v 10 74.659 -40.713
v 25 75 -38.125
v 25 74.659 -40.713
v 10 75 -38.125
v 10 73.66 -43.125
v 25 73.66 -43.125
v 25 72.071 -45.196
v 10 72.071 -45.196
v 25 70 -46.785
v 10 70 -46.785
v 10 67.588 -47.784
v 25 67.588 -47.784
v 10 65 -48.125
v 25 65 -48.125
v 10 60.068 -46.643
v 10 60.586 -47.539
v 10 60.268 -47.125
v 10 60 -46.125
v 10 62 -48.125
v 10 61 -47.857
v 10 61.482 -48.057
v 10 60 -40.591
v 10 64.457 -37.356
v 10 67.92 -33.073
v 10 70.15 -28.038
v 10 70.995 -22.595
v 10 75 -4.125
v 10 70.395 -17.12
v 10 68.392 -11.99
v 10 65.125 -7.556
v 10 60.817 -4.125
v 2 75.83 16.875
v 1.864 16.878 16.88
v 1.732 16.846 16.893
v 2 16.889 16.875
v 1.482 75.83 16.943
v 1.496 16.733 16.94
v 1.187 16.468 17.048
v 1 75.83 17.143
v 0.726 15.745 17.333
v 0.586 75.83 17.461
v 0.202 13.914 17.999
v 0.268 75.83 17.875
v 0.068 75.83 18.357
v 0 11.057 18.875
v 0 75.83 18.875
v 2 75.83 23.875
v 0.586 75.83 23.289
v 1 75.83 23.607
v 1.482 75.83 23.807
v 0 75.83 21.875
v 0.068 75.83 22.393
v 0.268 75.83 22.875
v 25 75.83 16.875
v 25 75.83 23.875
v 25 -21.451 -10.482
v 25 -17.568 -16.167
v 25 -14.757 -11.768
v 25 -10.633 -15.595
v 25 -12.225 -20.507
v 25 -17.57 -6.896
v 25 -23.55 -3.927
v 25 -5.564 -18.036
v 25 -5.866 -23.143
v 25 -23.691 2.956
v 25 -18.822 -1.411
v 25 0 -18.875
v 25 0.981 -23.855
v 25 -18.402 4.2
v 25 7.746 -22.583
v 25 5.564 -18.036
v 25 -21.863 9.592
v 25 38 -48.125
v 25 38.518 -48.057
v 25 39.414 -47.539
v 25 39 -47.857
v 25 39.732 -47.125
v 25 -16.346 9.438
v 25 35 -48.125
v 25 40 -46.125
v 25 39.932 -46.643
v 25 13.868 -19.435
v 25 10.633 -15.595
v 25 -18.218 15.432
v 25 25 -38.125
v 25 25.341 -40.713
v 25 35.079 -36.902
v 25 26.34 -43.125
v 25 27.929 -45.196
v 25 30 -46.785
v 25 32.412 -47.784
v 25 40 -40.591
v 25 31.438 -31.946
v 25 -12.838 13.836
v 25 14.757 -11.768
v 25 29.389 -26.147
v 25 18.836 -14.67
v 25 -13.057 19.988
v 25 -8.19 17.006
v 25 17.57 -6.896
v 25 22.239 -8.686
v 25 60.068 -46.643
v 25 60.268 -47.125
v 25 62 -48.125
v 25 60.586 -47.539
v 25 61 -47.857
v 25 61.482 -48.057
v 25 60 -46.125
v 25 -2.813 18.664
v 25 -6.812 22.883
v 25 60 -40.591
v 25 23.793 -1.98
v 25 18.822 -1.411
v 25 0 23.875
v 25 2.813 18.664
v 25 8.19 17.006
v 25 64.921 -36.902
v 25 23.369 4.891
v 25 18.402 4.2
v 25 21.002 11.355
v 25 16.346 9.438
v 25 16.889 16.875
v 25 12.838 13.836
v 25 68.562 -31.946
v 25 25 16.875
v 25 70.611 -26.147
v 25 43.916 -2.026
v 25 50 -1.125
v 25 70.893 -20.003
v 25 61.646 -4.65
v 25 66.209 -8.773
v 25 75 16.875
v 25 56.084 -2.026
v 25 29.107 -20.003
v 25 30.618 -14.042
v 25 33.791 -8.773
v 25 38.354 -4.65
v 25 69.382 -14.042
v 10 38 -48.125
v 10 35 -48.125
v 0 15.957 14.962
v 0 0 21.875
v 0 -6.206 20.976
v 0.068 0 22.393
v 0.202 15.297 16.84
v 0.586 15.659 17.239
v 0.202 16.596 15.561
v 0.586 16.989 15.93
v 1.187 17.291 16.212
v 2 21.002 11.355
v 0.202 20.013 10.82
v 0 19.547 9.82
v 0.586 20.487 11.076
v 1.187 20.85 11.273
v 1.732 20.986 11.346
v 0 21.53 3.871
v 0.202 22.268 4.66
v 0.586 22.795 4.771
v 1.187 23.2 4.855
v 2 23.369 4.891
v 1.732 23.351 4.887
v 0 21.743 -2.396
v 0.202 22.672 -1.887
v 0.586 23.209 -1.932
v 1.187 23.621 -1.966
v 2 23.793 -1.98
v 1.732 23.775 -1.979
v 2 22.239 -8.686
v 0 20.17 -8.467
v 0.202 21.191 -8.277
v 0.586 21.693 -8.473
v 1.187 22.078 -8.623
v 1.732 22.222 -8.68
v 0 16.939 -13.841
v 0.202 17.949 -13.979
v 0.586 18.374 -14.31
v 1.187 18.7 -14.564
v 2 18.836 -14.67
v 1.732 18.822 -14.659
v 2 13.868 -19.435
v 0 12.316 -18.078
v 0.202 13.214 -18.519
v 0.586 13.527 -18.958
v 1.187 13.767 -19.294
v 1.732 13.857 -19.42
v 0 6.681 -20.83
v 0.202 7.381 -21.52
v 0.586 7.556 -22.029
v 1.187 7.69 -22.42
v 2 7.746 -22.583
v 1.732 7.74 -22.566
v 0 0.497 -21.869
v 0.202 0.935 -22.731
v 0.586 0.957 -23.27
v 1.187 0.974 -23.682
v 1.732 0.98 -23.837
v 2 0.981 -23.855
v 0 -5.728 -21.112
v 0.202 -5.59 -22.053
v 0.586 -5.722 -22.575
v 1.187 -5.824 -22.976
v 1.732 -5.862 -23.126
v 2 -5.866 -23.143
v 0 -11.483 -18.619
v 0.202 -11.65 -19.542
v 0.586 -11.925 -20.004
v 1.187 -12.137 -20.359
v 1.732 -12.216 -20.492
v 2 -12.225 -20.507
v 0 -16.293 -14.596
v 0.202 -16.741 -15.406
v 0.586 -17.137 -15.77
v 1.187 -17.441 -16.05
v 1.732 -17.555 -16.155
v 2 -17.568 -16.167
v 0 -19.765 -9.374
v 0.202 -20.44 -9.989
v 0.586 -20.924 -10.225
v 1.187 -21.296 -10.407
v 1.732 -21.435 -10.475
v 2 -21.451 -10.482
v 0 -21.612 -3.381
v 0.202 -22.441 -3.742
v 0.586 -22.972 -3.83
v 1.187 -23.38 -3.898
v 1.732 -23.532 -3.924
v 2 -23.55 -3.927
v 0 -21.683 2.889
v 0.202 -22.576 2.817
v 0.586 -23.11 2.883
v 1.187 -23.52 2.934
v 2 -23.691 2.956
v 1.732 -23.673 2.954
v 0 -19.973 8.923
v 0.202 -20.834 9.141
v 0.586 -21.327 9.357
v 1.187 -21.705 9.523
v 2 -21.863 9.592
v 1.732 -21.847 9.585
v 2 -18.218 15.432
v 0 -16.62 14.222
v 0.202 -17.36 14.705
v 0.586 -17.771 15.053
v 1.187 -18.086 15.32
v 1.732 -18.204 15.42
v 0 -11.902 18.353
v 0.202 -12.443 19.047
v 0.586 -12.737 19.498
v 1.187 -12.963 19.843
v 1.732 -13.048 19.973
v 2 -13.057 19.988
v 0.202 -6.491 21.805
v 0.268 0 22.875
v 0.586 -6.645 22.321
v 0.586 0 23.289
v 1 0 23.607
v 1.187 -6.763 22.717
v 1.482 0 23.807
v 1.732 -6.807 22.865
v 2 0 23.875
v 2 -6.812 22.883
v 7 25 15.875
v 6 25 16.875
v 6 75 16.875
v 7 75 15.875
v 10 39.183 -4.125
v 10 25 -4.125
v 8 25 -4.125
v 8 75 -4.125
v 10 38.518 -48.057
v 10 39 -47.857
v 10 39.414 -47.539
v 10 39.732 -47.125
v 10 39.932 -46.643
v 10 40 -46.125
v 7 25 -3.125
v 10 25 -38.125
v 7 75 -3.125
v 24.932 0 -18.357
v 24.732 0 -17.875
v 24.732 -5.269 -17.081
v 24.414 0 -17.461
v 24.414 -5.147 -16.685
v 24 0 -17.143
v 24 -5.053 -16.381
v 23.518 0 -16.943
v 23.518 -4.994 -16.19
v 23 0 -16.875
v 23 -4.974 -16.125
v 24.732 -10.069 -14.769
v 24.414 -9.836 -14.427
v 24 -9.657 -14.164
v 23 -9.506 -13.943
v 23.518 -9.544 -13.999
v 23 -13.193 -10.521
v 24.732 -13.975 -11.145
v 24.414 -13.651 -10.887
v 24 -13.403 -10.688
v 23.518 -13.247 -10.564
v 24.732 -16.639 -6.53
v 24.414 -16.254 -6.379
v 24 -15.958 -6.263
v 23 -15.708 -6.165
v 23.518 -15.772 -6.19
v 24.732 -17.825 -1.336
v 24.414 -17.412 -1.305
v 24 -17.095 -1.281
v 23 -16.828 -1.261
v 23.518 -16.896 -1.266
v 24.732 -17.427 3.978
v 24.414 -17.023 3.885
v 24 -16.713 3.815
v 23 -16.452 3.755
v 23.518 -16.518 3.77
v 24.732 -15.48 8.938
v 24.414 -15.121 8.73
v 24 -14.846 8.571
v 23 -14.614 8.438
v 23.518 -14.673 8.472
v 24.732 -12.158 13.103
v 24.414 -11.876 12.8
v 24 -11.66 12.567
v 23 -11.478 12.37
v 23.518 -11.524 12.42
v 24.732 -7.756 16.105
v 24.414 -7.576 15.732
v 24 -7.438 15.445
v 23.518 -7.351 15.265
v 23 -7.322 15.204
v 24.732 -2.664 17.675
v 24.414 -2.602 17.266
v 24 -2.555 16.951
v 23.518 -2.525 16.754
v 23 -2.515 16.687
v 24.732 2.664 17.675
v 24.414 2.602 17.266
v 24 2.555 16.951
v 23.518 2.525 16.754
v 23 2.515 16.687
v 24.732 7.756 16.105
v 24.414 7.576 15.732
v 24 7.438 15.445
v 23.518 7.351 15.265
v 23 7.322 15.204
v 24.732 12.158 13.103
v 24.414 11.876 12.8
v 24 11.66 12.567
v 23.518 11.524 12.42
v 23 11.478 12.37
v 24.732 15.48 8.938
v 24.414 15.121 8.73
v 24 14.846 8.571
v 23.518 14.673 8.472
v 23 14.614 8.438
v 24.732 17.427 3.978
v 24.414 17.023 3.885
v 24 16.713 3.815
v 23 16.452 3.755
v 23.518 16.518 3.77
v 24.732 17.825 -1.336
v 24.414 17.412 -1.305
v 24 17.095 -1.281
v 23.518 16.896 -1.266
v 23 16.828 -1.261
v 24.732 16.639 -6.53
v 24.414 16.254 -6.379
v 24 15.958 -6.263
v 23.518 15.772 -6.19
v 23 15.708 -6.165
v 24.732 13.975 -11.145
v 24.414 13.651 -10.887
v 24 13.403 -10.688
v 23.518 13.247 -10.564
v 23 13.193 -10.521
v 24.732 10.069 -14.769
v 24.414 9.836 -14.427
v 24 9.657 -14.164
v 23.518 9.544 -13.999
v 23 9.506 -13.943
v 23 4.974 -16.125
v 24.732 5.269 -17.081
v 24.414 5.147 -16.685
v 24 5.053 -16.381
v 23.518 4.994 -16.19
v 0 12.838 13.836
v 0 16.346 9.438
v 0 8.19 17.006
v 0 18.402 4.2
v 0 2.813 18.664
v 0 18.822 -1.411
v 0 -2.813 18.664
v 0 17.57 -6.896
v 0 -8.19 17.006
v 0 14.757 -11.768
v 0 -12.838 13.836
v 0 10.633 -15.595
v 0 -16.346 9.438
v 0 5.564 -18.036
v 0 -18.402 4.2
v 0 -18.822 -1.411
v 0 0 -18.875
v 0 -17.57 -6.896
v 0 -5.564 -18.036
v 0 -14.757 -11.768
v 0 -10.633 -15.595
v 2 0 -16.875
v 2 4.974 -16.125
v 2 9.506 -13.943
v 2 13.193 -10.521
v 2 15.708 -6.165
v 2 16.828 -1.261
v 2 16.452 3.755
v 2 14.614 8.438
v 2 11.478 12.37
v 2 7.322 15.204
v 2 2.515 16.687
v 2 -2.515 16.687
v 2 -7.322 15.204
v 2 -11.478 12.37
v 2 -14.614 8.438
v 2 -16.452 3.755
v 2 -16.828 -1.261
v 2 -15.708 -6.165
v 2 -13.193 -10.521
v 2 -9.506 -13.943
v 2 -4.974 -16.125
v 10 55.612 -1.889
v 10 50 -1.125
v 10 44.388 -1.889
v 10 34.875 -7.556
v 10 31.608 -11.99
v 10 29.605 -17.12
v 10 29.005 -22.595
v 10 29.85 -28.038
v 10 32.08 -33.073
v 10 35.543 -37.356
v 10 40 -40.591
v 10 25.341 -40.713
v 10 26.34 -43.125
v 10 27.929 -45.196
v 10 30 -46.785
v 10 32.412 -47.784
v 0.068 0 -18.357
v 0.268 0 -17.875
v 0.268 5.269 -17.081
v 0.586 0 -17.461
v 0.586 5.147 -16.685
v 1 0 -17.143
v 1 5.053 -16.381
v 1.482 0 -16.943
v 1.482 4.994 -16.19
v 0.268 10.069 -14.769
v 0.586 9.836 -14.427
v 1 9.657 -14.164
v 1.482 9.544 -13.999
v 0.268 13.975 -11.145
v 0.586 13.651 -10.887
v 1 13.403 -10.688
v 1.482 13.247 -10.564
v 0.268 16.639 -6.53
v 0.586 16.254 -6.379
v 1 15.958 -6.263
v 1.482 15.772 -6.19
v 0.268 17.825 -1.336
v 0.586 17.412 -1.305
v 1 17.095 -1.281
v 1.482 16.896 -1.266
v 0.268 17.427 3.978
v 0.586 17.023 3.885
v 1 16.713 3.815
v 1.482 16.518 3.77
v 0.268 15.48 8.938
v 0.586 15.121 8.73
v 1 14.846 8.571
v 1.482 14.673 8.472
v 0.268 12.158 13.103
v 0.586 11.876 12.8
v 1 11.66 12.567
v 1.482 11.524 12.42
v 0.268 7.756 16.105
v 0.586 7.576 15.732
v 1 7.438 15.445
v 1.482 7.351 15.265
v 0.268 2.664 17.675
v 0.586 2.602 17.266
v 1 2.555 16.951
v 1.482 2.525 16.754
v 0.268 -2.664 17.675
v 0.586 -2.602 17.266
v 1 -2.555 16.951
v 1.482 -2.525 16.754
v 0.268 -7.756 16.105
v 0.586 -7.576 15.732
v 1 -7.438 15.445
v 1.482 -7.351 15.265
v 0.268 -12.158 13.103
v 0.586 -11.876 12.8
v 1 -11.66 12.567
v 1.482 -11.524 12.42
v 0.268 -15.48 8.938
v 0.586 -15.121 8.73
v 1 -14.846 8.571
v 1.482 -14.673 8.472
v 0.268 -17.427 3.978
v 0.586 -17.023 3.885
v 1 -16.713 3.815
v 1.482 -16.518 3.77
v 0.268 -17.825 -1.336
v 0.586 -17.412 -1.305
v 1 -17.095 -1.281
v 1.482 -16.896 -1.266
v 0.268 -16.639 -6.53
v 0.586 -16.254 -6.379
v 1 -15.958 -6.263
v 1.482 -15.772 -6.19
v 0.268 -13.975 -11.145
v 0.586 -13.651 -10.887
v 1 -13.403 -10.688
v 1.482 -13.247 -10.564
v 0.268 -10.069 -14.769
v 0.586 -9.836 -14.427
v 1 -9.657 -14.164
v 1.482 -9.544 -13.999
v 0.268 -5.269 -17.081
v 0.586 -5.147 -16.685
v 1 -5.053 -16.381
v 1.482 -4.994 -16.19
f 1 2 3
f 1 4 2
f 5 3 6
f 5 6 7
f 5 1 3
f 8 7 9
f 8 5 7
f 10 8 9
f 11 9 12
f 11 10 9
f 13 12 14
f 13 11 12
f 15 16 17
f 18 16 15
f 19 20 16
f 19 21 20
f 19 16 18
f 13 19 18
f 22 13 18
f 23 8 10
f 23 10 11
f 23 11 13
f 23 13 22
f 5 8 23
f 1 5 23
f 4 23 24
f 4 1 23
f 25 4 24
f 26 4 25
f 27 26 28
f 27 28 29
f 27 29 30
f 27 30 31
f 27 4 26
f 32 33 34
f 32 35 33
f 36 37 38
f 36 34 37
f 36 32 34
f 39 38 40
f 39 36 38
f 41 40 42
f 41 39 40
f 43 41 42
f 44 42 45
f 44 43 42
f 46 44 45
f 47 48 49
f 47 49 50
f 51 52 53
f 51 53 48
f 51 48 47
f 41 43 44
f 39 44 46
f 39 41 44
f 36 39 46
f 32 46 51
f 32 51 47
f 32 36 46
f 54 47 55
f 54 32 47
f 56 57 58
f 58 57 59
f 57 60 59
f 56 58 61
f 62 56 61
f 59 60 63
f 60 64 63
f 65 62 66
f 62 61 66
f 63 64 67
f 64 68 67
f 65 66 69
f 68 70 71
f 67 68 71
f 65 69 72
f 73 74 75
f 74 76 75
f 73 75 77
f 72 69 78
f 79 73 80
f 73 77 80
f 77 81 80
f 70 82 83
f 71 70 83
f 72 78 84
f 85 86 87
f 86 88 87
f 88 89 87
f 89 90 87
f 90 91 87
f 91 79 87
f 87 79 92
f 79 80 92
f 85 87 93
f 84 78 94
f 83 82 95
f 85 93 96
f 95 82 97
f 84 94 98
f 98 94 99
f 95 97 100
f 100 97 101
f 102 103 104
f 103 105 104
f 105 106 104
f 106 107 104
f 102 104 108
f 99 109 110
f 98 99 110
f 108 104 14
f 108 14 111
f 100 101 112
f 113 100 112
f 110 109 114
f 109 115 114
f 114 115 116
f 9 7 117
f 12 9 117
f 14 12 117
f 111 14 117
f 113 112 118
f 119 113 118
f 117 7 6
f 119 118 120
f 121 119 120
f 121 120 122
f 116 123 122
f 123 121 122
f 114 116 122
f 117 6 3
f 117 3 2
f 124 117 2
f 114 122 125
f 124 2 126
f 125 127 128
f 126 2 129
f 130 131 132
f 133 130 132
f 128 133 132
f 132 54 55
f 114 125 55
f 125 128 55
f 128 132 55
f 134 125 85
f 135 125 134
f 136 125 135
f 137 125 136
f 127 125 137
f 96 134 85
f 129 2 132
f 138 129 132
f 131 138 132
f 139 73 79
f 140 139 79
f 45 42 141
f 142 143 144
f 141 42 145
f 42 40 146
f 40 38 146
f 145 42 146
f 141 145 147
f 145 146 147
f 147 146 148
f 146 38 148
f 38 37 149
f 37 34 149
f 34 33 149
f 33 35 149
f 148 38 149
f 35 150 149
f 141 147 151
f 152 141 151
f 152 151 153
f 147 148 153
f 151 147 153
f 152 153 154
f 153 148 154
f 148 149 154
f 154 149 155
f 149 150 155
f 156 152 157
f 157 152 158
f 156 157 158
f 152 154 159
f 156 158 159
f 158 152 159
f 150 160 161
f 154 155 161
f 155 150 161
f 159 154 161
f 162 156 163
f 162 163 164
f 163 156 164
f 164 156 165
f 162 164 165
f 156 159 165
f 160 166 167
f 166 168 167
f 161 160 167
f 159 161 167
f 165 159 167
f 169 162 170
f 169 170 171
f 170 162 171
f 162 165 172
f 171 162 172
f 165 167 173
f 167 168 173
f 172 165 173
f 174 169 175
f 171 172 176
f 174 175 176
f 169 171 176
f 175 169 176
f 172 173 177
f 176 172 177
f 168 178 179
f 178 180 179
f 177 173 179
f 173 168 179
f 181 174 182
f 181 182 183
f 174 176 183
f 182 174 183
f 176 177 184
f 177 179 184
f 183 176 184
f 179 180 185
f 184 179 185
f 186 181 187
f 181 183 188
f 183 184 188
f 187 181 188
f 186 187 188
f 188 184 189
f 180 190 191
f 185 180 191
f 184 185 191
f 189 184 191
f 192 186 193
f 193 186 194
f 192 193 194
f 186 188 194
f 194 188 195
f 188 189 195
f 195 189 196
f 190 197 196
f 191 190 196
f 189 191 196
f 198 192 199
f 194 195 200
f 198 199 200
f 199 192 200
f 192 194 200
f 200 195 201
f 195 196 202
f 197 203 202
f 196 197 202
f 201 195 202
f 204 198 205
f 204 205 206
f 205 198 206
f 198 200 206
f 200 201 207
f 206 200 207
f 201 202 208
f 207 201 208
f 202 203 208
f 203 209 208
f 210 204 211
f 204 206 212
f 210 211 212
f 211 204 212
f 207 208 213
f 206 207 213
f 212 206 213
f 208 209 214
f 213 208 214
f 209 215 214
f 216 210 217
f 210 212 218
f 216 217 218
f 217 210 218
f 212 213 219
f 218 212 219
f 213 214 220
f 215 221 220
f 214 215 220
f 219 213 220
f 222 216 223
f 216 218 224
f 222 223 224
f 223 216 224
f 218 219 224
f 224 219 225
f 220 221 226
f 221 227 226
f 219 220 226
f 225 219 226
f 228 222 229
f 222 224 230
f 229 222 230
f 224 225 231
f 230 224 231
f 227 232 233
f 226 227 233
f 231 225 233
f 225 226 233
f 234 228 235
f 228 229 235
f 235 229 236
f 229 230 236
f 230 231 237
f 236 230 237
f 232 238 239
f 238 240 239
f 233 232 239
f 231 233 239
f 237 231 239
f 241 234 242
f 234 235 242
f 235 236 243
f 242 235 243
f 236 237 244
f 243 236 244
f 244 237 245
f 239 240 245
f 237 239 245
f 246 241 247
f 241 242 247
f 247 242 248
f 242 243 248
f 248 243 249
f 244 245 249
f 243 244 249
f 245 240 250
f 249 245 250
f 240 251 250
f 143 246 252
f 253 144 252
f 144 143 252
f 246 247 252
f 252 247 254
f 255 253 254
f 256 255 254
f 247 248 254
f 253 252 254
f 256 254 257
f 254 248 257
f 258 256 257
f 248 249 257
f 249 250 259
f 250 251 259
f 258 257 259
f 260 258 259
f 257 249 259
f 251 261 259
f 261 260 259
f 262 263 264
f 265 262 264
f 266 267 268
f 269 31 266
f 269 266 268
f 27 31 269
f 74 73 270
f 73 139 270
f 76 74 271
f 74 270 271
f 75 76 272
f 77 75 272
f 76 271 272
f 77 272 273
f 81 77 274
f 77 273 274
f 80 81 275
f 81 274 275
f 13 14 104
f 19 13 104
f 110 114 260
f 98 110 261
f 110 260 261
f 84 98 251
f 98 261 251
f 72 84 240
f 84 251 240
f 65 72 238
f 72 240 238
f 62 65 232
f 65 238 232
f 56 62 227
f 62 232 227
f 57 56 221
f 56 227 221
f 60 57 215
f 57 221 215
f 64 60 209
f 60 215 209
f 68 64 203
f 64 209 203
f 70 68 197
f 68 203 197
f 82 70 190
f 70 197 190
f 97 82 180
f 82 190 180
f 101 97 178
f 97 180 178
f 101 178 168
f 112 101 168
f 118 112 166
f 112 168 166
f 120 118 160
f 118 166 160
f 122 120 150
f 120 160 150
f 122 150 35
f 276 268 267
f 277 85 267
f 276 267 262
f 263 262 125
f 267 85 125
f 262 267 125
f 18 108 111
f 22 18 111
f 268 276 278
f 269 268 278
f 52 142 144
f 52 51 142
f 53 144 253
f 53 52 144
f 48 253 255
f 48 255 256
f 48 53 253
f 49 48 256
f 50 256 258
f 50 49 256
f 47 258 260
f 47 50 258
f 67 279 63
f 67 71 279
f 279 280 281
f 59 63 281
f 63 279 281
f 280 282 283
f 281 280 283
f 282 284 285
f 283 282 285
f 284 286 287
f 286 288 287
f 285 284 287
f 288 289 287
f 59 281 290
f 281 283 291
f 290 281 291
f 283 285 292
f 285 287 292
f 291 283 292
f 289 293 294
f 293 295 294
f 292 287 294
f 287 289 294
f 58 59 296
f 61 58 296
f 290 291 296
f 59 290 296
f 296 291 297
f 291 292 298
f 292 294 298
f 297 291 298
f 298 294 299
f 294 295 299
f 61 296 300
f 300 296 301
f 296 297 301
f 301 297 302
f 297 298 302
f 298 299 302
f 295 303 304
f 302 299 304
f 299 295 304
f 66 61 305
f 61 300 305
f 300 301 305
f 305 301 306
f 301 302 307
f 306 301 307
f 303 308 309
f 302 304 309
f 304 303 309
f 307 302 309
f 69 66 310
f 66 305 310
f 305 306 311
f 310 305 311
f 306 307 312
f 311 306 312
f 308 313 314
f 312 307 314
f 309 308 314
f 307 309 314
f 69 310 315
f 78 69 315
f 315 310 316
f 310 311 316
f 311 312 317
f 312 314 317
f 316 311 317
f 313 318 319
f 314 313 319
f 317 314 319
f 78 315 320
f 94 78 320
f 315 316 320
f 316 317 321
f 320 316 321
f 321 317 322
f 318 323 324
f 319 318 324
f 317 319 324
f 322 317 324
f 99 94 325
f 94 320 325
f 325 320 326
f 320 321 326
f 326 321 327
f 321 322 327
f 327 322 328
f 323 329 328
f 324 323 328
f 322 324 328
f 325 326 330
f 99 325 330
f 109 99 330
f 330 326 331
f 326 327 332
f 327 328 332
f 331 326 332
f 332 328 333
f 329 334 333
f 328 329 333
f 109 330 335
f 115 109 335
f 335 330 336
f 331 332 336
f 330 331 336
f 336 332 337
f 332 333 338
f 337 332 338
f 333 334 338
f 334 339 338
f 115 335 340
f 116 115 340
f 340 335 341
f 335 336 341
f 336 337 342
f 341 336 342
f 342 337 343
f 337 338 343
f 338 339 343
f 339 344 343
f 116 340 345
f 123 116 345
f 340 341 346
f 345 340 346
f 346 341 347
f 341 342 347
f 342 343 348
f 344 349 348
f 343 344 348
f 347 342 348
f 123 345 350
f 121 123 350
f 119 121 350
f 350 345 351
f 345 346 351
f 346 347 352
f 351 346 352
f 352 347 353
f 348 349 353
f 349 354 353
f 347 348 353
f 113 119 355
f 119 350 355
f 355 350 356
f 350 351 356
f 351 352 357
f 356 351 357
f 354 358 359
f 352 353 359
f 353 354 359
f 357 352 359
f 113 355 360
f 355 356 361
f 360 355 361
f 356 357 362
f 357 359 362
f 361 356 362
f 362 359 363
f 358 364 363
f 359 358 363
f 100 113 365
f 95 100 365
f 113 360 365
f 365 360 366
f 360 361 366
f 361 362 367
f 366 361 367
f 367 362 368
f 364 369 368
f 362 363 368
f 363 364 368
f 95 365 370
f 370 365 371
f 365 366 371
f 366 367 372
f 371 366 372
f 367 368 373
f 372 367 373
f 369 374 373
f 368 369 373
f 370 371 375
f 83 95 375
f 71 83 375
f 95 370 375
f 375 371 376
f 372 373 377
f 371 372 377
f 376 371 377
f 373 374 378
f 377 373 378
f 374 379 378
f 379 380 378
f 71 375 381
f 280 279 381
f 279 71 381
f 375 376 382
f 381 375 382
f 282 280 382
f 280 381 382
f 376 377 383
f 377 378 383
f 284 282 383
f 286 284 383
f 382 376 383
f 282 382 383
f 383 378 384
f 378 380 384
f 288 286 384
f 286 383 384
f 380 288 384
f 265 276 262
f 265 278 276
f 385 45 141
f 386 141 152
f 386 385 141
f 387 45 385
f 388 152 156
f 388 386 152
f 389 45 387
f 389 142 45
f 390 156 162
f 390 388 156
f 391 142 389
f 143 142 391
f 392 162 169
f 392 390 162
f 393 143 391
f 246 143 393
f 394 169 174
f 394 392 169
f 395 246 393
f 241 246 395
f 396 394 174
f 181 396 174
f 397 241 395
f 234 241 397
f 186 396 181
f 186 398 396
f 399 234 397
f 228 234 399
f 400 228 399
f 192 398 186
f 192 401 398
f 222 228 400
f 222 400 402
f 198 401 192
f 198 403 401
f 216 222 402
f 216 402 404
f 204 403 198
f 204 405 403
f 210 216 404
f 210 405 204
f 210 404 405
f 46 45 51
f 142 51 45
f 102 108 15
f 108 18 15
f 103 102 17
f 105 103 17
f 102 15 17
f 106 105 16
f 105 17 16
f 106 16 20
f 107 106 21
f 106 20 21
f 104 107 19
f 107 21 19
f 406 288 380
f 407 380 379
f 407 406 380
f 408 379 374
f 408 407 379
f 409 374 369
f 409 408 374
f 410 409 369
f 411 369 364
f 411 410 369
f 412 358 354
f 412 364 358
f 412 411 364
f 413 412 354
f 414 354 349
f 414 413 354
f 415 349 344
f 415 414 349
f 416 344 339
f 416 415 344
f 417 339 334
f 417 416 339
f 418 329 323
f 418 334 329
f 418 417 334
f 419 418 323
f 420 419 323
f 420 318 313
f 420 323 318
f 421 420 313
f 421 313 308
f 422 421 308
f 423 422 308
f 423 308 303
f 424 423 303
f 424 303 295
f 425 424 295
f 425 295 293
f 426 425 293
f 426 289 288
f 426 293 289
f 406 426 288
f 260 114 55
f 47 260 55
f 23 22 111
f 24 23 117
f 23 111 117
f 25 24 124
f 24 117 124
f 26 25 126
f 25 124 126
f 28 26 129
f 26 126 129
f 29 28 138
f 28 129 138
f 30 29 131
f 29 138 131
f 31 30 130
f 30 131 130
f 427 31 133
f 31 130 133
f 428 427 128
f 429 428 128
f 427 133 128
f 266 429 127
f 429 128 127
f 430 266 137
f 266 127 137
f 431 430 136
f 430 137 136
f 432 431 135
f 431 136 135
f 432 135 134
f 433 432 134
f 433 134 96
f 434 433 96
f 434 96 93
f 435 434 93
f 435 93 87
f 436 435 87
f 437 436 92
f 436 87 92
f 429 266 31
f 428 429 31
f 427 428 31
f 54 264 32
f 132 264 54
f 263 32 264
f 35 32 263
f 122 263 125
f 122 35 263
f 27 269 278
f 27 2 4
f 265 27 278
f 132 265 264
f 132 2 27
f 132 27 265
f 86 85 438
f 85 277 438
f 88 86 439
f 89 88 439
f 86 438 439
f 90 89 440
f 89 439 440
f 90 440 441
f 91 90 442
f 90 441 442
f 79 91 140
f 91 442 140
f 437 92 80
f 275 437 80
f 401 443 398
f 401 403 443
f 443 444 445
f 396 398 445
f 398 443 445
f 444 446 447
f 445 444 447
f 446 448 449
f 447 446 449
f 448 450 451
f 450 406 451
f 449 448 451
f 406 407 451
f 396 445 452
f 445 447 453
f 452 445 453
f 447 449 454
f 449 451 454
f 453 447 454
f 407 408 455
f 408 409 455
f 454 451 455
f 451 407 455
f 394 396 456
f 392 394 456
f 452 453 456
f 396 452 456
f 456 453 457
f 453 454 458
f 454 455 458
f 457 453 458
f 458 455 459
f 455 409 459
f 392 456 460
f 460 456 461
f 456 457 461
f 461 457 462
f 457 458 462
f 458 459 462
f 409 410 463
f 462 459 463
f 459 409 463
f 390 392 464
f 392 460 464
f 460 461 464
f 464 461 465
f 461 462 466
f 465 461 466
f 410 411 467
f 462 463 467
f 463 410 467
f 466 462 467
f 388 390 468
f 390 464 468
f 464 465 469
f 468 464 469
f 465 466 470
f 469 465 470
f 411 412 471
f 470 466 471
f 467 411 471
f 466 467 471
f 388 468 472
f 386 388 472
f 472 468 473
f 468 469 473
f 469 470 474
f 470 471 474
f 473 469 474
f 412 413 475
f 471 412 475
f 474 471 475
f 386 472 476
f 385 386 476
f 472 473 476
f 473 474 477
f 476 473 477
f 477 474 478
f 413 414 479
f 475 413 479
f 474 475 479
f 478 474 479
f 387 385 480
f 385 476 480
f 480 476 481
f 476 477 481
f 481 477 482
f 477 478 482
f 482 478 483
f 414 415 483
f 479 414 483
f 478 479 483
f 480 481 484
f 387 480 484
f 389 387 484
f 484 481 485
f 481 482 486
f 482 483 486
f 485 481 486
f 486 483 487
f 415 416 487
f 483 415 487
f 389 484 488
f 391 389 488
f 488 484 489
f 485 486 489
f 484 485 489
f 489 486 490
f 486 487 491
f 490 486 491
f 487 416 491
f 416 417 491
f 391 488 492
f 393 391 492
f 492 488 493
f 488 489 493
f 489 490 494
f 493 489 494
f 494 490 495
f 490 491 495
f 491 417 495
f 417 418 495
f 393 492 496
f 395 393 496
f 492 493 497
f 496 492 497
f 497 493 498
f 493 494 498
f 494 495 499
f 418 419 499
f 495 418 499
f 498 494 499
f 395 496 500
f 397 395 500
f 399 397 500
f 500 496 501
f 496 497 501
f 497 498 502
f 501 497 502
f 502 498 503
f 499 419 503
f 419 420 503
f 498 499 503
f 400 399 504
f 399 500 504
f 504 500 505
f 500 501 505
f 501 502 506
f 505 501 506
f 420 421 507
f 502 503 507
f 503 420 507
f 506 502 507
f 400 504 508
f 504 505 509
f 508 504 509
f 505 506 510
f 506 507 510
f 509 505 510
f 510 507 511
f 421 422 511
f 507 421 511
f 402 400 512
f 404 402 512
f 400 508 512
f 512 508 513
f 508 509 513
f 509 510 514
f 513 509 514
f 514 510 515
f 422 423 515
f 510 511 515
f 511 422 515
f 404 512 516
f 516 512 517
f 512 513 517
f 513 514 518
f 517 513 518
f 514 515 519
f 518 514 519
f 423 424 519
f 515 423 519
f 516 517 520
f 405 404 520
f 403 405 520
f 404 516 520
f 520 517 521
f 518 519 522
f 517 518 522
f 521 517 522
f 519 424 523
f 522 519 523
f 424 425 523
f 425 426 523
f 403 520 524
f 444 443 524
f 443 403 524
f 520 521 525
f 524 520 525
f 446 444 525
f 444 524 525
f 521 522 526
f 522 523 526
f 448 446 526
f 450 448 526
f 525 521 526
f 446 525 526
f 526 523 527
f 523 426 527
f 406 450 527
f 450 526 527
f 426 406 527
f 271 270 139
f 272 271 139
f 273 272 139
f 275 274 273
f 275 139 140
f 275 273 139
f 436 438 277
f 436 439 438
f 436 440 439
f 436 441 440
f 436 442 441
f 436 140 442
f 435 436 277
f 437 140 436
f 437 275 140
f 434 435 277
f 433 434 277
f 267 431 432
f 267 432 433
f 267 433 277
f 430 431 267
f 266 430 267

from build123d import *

# Parameters (mm, degrees)
SKETCH1_R           = 23.875
SKETCH1_R_2         = 16.875
BOSS_EXTRUDE1_DEPTH = 25
SKETCH2_W           = 25
SKETCH2_H           = 7
BOSS_EXTRUDE2_DEPTH = 75.83
BOSS_EXTRUDE3_DEPTH = 15
FILLET1_R           = 10
FILLET2_R           = 2
FILLET3_R           = 2
SKETCH5_W           = 21
SKETCH5_H           = 50
BOSS_EXTRUDE4_DEPTH = 3
CHAMFER1_SIZE       = 1


with BuildPart() as part:
    # Sketch1 → Boss-Extrude1 (new body)
    with BuildSketch(Plane(origin=(0, 0, 0), x_dir=(0, 0, -1), z_dir=(1, 0, 0))):
        Circle(SKETCH1_R)
        Circle(SKETCH1_R_2, mode=Mode.SUBTRACT)
    extrude(amount=BOSS_EXTRUDE1_DEPTH)

    # Sketch2 → Boss-Extrude2 (add)
    with BuildSketch(Plane(origin=(0, 0, 0), x_dir=(1, 0, 0), z_dir=(0, 1, 0))):
        with Locations((12.5, -20.375)):
            Rectangle(SKETCH2_W, SKETCH2_H)
    extrude(amount=BOSS_EXTRUDE2_DEPTH)

    # Sketch4 → Boss-Extrude3 (add)
    with BuildSketch(Plane.ZY.offset(-25)):
        with BuildLine():
            Line((-40.591185313, 40), (-48.125, 40))
            Line((-48.125, 40), (-48.125, 25))
            Line((-48.125, 25), (23.875, 25))
            Line((23.875, 25), (23.875, 75))
            Line((23.875, 75), (-48.125, 75))
            Line((-48.125, 75), (-48.125, 60))
            Line((-48.125, 60), (-40.591185313, 60))
            ThreePointArc((-40.591185313, 60), (-1.125, 50), (-40.591185313, 40))
        make_face()
    extrude(amount=BOSS_EXTRUDE3_DEPTH)

    # Fillet1
    fillet1_edges = [part.edges().sort_by_distance(p)[0] for p in [
        (17.5, 75, -48.125),
        (17.5, 25, -48.125),
    ]]
    fillet(fillet1_edges, radius=FILLET1_R)

    # Fillet2
    fillet2_edges = [part.edges().sort_by_distance(p)[0] for p in [
        (0, -9.141252649, -22.055682374),
        (0, 46.359672877, 16.875),
        (0, 37.915, 23.875),
        (0, 0, 16.875),
        (25, 0, 16.875),
    ]]
    fillet(fillet2_edges, radius=FILLET2_R)

    # Fillet3
    fillet3_edges = [part.edges().sort_by_distance(p)[0] for p in [
        (17.5, 60, -48.125),
        (17.5, 40, -48.125),
    ]]
    fillet(fillet3_edges, radius=FILLET3_R)

    # Sketch5 → Boss-Extrude4 (add)
    with BuildSketch(Plane.ZY.offset(-10)):
        with Locations((6.375, 50)):
            Rectangle(SKETCH5_W, SKETCH5_H)
    extrude(amount=BOSS_EXTRUDE4_DEPTH)

    # Chamfer1
    chamfer1_edges = [part.edges().sort_by_distance(p)[0] for p in [
        (7, 50, 16.875),
        (7, 50, -4.125),
    ]]
    chamfer(chamfer1_edges, length=CHAMFER1_SIZE)


solid = part.part
